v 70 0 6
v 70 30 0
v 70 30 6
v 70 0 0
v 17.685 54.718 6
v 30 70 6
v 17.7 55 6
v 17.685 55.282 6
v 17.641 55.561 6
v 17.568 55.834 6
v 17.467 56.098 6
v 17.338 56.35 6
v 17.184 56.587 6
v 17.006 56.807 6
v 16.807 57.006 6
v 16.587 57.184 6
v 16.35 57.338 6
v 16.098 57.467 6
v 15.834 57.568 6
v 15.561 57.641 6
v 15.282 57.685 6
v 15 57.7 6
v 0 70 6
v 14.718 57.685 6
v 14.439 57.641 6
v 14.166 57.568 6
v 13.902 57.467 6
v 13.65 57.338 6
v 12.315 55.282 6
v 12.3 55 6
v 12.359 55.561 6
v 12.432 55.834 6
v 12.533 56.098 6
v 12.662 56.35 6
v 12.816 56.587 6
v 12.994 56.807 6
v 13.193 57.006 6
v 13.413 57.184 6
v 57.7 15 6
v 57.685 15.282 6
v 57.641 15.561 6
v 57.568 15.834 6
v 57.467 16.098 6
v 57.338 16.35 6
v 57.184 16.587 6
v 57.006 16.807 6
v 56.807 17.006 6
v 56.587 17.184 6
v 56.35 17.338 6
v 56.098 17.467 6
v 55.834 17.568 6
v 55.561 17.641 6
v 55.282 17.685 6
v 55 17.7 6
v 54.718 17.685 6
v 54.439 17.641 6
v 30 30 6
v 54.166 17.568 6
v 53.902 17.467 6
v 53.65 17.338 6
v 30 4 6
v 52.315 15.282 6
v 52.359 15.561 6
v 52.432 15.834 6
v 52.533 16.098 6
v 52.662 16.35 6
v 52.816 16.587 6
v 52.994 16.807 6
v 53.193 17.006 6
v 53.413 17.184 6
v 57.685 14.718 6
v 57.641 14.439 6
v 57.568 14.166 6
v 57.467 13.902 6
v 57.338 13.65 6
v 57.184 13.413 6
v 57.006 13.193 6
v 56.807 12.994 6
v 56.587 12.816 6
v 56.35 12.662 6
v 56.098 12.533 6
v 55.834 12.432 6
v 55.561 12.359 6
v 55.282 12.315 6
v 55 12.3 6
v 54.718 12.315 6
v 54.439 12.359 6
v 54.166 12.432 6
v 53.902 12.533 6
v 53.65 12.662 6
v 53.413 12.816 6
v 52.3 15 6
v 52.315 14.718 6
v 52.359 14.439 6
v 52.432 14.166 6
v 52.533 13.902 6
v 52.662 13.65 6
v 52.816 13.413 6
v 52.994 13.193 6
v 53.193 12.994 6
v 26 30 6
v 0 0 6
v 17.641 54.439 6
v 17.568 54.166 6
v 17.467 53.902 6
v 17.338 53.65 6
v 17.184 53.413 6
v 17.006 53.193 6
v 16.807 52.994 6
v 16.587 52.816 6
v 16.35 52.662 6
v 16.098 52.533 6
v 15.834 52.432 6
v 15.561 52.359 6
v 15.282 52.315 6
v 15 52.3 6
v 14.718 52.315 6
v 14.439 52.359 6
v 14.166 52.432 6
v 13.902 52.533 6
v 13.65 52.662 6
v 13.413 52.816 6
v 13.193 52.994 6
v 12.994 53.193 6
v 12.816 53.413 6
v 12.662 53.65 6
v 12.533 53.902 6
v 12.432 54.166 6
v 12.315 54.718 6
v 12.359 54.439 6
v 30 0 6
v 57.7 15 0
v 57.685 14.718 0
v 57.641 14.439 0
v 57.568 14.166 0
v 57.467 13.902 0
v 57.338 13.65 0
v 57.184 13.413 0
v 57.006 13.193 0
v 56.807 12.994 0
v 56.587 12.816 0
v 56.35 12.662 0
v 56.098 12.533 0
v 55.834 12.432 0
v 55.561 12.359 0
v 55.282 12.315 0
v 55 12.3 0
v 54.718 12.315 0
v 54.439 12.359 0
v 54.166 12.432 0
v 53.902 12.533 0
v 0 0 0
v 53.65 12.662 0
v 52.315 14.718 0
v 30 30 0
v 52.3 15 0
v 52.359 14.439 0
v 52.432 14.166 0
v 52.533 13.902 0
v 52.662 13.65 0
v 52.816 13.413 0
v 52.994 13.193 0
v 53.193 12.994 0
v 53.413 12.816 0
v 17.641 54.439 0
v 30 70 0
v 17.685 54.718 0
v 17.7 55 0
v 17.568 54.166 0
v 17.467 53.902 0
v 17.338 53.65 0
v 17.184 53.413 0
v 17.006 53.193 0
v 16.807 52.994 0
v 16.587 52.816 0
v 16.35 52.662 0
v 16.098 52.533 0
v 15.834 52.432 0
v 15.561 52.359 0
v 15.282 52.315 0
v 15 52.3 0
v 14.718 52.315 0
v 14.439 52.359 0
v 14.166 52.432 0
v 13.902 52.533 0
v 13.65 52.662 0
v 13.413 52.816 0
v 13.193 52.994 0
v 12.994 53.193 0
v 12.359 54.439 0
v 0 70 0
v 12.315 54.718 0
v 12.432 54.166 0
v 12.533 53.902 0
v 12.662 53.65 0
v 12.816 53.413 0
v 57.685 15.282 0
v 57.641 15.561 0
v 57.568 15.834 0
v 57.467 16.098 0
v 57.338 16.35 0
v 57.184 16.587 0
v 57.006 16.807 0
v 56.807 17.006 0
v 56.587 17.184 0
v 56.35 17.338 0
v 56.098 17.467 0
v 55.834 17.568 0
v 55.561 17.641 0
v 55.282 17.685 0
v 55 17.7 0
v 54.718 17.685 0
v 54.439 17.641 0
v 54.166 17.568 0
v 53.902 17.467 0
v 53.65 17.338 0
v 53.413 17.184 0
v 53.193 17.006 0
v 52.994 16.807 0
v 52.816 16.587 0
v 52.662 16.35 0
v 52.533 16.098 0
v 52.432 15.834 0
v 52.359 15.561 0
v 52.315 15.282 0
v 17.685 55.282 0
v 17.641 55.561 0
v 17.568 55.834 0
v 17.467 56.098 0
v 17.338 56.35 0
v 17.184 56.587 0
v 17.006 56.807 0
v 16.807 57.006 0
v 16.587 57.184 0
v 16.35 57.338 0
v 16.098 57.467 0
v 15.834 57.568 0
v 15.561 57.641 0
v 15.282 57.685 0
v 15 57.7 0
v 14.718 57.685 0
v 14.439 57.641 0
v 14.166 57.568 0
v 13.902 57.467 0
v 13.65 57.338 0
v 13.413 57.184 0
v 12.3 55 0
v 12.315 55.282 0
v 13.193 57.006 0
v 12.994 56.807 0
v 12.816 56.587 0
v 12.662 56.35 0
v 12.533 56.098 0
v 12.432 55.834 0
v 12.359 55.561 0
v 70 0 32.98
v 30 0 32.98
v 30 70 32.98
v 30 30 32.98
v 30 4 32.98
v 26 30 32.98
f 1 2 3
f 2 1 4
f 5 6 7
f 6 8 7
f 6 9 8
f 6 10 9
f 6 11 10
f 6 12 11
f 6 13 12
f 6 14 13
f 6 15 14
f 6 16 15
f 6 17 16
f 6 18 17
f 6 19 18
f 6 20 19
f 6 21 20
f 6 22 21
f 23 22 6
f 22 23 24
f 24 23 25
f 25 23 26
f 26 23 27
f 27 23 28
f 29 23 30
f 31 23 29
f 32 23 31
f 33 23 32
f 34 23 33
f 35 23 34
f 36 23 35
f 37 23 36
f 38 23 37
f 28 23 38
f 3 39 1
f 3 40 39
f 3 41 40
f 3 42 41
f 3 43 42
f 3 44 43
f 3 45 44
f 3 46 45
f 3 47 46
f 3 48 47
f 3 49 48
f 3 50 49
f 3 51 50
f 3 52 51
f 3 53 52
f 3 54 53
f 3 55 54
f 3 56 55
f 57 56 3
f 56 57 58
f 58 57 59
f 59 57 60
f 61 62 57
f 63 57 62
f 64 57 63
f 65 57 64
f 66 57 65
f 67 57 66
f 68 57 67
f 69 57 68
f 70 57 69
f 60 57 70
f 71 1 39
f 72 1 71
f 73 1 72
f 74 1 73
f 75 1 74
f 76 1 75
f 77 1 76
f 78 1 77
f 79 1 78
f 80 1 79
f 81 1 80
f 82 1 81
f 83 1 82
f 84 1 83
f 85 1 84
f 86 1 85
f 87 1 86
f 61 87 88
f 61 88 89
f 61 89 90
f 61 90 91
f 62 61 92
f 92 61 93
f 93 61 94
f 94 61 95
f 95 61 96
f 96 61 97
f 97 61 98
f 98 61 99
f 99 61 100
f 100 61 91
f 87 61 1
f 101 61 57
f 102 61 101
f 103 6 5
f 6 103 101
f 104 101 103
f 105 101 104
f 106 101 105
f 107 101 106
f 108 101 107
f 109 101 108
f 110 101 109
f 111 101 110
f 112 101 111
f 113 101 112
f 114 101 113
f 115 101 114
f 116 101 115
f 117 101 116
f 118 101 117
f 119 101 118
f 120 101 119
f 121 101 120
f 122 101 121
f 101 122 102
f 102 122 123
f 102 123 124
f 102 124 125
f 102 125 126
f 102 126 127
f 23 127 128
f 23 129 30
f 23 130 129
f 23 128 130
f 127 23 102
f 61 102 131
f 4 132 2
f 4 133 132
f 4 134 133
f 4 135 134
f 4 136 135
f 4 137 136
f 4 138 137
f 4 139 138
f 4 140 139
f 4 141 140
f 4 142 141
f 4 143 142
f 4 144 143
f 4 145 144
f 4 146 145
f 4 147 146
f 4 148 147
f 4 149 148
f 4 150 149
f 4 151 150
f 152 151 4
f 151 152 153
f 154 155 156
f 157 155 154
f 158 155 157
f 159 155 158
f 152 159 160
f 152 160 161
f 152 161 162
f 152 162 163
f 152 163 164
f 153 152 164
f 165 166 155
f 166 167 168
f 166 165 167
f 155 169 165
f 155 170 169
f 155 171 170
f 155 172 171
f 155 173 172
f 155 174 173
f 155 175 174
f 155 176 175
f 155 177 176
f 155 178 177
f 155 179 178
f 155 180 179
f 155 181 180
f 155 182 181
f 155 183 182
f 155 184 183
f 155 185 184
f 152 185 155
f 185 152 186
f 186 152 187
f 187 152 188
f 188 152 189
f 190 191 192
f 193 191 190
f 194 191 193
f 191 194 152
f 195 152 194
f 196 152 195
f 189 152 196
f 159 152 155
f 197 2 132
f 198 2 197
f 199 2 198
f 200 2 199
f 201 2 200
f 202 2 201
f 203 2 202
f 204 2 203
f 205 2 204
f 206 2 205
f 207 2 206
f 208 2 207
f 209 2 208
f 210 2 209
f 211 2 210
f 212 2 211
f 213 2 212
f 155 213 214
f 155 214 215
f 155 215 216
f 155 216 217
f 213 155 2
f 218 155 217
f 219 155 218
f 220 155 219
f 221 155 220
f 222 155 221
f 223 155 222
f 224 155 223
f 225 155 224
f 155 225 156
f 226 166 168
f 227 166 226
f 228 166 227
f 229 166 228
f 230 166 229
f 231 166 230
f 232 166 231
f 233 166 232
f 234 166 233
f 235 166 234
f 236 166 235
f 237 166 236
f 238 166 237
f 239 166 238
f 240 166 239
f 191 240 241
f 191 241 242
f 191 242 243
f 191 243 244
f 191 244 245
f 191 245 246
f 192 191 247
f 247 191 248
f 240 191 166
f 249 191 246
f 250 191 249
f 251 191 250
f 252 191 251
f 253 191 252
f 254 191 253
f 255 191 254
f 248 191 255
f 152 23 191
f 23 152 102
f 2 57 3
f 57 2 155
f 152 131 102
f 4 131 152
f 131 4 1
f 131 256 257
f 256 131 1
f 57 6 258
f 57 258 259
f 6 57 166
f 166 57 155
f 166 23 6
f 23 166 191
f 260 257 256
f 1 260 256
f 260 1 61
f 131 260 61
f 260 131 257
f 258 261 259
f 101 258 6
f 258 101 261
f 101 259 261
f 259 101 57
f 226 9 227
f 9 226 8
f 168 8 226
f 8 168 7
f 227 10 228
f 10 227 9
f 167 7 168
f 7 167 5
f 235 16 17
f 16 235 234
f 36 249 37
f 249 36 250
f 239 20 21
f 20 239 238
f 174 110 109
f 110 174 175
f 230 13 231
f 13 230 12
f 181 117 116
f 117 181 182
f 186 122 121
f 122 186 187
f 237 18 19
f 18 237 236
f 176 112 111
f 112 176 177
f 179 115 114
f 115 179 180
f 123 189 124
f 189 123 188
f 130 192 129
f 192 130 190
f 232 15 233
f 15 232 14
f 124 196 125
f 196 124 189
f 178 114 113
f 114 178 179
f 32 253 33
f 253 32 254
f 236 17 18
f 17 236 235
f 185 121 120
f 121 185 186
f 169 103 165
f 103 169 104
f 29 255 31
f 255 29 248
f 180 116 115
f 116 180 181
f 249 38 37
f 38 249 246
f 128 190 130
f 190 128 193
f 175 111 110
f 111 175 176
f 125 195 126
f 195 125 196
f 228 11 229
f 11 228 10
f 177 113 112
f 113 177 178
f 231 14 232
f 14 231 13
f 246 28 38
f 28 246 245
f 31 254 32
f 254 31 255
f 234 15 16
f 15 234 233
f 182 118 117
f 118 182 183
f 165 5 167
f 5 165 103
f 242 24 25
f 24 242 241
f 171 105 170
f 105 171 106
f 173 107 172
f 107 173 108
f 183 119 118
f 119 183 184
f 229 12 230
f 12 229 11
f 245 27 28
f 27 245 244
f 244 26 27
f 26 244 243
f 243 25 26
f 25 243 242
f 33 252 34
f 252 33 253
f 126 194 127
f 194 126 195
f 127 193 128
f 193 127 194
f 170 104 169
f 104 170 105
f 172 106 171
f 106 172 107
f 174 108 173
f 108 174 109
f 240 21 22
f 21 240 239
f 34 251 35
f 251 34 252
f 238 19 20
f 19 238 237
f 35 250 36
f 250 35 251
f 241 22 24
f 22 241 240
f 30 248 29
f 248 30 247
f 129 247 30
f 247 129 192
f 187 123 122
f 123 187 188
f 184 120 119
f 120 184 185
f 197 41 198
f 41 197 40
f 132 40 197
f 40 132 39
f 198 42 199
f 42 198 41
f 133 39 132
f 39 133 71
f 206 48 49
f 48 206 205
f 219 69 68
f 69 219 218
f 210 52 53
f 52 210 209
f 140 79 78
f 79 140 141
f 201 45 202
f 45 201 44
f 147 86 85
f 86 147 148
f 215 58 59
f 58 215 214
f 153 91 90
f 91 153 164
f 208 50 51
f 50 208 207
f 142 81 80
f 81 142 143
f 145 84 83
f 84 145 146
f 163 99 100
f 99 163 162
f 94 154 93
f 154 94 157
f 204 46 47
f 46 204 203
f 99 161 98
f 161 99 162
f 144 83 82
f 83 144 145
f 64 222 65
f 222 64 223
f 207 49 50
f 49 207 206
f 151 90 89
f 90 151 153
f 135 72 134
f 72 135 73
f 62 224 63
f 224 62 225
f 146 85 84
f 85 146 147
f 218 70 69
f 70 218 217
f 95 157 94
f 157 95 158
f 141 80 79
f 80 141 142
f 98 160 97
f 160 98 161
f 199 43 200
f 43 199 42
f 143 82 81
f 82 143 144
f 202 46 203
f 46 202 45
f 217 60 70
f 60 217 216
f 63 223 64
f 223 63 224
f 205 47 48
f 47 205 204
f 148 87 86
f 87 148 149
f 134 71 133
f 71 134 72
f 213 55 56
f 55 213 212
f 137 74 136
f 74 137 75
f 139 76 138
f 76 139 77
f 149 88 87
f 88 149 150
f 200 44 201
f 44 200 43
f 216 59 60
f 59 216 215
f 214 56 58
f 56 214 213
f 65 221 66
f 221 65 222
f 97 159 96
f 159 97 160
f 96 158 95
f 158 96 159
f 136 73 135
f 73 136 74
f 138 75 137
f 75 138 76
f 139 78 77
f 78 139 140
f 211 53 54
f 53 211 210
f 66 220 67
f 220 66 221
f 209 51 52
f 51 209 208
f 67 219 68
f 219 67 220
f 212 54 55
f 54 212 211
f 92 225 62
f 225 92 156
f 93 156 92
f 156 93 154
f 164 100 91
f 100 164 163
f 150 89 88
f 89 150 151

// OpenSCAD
// Reinforced right-angle gusset for 30 mm profile.
$fn = 60;
eps = 0.02;
profile = 30;
arm = 70;
plate_t = 6;
rib_t = 4;
rib_h = 27;
module rib_x() {
    translate([profile, 0, plate_t - eps]) linear_extrude(height = rib_h)
        polygon(points = [[0, 0], [arm - profile, 0], [0, rib_t]]);
}
module rib_y() {
    translate([profile, profile, plate_t - eps]) rotate([0, 0, 90]) linear_extrude(height = rib_h)
        polygon(points = [[0, 0], [arm - profile, 0], [0, rib_t]]);
}
difference() {
    union() { cube([arm, profile, plate_t]); cube([profile, arm, plate_t]); rib_x(); rib_y(); }
    for (p = [[profile / 2, arm - profile / 2], [arm - profile / 2, profile / 2]])
        translate([p[0], p[1], -eps]) cylinder(d = 5.4, h = plate_t + 2 * eps);
}
